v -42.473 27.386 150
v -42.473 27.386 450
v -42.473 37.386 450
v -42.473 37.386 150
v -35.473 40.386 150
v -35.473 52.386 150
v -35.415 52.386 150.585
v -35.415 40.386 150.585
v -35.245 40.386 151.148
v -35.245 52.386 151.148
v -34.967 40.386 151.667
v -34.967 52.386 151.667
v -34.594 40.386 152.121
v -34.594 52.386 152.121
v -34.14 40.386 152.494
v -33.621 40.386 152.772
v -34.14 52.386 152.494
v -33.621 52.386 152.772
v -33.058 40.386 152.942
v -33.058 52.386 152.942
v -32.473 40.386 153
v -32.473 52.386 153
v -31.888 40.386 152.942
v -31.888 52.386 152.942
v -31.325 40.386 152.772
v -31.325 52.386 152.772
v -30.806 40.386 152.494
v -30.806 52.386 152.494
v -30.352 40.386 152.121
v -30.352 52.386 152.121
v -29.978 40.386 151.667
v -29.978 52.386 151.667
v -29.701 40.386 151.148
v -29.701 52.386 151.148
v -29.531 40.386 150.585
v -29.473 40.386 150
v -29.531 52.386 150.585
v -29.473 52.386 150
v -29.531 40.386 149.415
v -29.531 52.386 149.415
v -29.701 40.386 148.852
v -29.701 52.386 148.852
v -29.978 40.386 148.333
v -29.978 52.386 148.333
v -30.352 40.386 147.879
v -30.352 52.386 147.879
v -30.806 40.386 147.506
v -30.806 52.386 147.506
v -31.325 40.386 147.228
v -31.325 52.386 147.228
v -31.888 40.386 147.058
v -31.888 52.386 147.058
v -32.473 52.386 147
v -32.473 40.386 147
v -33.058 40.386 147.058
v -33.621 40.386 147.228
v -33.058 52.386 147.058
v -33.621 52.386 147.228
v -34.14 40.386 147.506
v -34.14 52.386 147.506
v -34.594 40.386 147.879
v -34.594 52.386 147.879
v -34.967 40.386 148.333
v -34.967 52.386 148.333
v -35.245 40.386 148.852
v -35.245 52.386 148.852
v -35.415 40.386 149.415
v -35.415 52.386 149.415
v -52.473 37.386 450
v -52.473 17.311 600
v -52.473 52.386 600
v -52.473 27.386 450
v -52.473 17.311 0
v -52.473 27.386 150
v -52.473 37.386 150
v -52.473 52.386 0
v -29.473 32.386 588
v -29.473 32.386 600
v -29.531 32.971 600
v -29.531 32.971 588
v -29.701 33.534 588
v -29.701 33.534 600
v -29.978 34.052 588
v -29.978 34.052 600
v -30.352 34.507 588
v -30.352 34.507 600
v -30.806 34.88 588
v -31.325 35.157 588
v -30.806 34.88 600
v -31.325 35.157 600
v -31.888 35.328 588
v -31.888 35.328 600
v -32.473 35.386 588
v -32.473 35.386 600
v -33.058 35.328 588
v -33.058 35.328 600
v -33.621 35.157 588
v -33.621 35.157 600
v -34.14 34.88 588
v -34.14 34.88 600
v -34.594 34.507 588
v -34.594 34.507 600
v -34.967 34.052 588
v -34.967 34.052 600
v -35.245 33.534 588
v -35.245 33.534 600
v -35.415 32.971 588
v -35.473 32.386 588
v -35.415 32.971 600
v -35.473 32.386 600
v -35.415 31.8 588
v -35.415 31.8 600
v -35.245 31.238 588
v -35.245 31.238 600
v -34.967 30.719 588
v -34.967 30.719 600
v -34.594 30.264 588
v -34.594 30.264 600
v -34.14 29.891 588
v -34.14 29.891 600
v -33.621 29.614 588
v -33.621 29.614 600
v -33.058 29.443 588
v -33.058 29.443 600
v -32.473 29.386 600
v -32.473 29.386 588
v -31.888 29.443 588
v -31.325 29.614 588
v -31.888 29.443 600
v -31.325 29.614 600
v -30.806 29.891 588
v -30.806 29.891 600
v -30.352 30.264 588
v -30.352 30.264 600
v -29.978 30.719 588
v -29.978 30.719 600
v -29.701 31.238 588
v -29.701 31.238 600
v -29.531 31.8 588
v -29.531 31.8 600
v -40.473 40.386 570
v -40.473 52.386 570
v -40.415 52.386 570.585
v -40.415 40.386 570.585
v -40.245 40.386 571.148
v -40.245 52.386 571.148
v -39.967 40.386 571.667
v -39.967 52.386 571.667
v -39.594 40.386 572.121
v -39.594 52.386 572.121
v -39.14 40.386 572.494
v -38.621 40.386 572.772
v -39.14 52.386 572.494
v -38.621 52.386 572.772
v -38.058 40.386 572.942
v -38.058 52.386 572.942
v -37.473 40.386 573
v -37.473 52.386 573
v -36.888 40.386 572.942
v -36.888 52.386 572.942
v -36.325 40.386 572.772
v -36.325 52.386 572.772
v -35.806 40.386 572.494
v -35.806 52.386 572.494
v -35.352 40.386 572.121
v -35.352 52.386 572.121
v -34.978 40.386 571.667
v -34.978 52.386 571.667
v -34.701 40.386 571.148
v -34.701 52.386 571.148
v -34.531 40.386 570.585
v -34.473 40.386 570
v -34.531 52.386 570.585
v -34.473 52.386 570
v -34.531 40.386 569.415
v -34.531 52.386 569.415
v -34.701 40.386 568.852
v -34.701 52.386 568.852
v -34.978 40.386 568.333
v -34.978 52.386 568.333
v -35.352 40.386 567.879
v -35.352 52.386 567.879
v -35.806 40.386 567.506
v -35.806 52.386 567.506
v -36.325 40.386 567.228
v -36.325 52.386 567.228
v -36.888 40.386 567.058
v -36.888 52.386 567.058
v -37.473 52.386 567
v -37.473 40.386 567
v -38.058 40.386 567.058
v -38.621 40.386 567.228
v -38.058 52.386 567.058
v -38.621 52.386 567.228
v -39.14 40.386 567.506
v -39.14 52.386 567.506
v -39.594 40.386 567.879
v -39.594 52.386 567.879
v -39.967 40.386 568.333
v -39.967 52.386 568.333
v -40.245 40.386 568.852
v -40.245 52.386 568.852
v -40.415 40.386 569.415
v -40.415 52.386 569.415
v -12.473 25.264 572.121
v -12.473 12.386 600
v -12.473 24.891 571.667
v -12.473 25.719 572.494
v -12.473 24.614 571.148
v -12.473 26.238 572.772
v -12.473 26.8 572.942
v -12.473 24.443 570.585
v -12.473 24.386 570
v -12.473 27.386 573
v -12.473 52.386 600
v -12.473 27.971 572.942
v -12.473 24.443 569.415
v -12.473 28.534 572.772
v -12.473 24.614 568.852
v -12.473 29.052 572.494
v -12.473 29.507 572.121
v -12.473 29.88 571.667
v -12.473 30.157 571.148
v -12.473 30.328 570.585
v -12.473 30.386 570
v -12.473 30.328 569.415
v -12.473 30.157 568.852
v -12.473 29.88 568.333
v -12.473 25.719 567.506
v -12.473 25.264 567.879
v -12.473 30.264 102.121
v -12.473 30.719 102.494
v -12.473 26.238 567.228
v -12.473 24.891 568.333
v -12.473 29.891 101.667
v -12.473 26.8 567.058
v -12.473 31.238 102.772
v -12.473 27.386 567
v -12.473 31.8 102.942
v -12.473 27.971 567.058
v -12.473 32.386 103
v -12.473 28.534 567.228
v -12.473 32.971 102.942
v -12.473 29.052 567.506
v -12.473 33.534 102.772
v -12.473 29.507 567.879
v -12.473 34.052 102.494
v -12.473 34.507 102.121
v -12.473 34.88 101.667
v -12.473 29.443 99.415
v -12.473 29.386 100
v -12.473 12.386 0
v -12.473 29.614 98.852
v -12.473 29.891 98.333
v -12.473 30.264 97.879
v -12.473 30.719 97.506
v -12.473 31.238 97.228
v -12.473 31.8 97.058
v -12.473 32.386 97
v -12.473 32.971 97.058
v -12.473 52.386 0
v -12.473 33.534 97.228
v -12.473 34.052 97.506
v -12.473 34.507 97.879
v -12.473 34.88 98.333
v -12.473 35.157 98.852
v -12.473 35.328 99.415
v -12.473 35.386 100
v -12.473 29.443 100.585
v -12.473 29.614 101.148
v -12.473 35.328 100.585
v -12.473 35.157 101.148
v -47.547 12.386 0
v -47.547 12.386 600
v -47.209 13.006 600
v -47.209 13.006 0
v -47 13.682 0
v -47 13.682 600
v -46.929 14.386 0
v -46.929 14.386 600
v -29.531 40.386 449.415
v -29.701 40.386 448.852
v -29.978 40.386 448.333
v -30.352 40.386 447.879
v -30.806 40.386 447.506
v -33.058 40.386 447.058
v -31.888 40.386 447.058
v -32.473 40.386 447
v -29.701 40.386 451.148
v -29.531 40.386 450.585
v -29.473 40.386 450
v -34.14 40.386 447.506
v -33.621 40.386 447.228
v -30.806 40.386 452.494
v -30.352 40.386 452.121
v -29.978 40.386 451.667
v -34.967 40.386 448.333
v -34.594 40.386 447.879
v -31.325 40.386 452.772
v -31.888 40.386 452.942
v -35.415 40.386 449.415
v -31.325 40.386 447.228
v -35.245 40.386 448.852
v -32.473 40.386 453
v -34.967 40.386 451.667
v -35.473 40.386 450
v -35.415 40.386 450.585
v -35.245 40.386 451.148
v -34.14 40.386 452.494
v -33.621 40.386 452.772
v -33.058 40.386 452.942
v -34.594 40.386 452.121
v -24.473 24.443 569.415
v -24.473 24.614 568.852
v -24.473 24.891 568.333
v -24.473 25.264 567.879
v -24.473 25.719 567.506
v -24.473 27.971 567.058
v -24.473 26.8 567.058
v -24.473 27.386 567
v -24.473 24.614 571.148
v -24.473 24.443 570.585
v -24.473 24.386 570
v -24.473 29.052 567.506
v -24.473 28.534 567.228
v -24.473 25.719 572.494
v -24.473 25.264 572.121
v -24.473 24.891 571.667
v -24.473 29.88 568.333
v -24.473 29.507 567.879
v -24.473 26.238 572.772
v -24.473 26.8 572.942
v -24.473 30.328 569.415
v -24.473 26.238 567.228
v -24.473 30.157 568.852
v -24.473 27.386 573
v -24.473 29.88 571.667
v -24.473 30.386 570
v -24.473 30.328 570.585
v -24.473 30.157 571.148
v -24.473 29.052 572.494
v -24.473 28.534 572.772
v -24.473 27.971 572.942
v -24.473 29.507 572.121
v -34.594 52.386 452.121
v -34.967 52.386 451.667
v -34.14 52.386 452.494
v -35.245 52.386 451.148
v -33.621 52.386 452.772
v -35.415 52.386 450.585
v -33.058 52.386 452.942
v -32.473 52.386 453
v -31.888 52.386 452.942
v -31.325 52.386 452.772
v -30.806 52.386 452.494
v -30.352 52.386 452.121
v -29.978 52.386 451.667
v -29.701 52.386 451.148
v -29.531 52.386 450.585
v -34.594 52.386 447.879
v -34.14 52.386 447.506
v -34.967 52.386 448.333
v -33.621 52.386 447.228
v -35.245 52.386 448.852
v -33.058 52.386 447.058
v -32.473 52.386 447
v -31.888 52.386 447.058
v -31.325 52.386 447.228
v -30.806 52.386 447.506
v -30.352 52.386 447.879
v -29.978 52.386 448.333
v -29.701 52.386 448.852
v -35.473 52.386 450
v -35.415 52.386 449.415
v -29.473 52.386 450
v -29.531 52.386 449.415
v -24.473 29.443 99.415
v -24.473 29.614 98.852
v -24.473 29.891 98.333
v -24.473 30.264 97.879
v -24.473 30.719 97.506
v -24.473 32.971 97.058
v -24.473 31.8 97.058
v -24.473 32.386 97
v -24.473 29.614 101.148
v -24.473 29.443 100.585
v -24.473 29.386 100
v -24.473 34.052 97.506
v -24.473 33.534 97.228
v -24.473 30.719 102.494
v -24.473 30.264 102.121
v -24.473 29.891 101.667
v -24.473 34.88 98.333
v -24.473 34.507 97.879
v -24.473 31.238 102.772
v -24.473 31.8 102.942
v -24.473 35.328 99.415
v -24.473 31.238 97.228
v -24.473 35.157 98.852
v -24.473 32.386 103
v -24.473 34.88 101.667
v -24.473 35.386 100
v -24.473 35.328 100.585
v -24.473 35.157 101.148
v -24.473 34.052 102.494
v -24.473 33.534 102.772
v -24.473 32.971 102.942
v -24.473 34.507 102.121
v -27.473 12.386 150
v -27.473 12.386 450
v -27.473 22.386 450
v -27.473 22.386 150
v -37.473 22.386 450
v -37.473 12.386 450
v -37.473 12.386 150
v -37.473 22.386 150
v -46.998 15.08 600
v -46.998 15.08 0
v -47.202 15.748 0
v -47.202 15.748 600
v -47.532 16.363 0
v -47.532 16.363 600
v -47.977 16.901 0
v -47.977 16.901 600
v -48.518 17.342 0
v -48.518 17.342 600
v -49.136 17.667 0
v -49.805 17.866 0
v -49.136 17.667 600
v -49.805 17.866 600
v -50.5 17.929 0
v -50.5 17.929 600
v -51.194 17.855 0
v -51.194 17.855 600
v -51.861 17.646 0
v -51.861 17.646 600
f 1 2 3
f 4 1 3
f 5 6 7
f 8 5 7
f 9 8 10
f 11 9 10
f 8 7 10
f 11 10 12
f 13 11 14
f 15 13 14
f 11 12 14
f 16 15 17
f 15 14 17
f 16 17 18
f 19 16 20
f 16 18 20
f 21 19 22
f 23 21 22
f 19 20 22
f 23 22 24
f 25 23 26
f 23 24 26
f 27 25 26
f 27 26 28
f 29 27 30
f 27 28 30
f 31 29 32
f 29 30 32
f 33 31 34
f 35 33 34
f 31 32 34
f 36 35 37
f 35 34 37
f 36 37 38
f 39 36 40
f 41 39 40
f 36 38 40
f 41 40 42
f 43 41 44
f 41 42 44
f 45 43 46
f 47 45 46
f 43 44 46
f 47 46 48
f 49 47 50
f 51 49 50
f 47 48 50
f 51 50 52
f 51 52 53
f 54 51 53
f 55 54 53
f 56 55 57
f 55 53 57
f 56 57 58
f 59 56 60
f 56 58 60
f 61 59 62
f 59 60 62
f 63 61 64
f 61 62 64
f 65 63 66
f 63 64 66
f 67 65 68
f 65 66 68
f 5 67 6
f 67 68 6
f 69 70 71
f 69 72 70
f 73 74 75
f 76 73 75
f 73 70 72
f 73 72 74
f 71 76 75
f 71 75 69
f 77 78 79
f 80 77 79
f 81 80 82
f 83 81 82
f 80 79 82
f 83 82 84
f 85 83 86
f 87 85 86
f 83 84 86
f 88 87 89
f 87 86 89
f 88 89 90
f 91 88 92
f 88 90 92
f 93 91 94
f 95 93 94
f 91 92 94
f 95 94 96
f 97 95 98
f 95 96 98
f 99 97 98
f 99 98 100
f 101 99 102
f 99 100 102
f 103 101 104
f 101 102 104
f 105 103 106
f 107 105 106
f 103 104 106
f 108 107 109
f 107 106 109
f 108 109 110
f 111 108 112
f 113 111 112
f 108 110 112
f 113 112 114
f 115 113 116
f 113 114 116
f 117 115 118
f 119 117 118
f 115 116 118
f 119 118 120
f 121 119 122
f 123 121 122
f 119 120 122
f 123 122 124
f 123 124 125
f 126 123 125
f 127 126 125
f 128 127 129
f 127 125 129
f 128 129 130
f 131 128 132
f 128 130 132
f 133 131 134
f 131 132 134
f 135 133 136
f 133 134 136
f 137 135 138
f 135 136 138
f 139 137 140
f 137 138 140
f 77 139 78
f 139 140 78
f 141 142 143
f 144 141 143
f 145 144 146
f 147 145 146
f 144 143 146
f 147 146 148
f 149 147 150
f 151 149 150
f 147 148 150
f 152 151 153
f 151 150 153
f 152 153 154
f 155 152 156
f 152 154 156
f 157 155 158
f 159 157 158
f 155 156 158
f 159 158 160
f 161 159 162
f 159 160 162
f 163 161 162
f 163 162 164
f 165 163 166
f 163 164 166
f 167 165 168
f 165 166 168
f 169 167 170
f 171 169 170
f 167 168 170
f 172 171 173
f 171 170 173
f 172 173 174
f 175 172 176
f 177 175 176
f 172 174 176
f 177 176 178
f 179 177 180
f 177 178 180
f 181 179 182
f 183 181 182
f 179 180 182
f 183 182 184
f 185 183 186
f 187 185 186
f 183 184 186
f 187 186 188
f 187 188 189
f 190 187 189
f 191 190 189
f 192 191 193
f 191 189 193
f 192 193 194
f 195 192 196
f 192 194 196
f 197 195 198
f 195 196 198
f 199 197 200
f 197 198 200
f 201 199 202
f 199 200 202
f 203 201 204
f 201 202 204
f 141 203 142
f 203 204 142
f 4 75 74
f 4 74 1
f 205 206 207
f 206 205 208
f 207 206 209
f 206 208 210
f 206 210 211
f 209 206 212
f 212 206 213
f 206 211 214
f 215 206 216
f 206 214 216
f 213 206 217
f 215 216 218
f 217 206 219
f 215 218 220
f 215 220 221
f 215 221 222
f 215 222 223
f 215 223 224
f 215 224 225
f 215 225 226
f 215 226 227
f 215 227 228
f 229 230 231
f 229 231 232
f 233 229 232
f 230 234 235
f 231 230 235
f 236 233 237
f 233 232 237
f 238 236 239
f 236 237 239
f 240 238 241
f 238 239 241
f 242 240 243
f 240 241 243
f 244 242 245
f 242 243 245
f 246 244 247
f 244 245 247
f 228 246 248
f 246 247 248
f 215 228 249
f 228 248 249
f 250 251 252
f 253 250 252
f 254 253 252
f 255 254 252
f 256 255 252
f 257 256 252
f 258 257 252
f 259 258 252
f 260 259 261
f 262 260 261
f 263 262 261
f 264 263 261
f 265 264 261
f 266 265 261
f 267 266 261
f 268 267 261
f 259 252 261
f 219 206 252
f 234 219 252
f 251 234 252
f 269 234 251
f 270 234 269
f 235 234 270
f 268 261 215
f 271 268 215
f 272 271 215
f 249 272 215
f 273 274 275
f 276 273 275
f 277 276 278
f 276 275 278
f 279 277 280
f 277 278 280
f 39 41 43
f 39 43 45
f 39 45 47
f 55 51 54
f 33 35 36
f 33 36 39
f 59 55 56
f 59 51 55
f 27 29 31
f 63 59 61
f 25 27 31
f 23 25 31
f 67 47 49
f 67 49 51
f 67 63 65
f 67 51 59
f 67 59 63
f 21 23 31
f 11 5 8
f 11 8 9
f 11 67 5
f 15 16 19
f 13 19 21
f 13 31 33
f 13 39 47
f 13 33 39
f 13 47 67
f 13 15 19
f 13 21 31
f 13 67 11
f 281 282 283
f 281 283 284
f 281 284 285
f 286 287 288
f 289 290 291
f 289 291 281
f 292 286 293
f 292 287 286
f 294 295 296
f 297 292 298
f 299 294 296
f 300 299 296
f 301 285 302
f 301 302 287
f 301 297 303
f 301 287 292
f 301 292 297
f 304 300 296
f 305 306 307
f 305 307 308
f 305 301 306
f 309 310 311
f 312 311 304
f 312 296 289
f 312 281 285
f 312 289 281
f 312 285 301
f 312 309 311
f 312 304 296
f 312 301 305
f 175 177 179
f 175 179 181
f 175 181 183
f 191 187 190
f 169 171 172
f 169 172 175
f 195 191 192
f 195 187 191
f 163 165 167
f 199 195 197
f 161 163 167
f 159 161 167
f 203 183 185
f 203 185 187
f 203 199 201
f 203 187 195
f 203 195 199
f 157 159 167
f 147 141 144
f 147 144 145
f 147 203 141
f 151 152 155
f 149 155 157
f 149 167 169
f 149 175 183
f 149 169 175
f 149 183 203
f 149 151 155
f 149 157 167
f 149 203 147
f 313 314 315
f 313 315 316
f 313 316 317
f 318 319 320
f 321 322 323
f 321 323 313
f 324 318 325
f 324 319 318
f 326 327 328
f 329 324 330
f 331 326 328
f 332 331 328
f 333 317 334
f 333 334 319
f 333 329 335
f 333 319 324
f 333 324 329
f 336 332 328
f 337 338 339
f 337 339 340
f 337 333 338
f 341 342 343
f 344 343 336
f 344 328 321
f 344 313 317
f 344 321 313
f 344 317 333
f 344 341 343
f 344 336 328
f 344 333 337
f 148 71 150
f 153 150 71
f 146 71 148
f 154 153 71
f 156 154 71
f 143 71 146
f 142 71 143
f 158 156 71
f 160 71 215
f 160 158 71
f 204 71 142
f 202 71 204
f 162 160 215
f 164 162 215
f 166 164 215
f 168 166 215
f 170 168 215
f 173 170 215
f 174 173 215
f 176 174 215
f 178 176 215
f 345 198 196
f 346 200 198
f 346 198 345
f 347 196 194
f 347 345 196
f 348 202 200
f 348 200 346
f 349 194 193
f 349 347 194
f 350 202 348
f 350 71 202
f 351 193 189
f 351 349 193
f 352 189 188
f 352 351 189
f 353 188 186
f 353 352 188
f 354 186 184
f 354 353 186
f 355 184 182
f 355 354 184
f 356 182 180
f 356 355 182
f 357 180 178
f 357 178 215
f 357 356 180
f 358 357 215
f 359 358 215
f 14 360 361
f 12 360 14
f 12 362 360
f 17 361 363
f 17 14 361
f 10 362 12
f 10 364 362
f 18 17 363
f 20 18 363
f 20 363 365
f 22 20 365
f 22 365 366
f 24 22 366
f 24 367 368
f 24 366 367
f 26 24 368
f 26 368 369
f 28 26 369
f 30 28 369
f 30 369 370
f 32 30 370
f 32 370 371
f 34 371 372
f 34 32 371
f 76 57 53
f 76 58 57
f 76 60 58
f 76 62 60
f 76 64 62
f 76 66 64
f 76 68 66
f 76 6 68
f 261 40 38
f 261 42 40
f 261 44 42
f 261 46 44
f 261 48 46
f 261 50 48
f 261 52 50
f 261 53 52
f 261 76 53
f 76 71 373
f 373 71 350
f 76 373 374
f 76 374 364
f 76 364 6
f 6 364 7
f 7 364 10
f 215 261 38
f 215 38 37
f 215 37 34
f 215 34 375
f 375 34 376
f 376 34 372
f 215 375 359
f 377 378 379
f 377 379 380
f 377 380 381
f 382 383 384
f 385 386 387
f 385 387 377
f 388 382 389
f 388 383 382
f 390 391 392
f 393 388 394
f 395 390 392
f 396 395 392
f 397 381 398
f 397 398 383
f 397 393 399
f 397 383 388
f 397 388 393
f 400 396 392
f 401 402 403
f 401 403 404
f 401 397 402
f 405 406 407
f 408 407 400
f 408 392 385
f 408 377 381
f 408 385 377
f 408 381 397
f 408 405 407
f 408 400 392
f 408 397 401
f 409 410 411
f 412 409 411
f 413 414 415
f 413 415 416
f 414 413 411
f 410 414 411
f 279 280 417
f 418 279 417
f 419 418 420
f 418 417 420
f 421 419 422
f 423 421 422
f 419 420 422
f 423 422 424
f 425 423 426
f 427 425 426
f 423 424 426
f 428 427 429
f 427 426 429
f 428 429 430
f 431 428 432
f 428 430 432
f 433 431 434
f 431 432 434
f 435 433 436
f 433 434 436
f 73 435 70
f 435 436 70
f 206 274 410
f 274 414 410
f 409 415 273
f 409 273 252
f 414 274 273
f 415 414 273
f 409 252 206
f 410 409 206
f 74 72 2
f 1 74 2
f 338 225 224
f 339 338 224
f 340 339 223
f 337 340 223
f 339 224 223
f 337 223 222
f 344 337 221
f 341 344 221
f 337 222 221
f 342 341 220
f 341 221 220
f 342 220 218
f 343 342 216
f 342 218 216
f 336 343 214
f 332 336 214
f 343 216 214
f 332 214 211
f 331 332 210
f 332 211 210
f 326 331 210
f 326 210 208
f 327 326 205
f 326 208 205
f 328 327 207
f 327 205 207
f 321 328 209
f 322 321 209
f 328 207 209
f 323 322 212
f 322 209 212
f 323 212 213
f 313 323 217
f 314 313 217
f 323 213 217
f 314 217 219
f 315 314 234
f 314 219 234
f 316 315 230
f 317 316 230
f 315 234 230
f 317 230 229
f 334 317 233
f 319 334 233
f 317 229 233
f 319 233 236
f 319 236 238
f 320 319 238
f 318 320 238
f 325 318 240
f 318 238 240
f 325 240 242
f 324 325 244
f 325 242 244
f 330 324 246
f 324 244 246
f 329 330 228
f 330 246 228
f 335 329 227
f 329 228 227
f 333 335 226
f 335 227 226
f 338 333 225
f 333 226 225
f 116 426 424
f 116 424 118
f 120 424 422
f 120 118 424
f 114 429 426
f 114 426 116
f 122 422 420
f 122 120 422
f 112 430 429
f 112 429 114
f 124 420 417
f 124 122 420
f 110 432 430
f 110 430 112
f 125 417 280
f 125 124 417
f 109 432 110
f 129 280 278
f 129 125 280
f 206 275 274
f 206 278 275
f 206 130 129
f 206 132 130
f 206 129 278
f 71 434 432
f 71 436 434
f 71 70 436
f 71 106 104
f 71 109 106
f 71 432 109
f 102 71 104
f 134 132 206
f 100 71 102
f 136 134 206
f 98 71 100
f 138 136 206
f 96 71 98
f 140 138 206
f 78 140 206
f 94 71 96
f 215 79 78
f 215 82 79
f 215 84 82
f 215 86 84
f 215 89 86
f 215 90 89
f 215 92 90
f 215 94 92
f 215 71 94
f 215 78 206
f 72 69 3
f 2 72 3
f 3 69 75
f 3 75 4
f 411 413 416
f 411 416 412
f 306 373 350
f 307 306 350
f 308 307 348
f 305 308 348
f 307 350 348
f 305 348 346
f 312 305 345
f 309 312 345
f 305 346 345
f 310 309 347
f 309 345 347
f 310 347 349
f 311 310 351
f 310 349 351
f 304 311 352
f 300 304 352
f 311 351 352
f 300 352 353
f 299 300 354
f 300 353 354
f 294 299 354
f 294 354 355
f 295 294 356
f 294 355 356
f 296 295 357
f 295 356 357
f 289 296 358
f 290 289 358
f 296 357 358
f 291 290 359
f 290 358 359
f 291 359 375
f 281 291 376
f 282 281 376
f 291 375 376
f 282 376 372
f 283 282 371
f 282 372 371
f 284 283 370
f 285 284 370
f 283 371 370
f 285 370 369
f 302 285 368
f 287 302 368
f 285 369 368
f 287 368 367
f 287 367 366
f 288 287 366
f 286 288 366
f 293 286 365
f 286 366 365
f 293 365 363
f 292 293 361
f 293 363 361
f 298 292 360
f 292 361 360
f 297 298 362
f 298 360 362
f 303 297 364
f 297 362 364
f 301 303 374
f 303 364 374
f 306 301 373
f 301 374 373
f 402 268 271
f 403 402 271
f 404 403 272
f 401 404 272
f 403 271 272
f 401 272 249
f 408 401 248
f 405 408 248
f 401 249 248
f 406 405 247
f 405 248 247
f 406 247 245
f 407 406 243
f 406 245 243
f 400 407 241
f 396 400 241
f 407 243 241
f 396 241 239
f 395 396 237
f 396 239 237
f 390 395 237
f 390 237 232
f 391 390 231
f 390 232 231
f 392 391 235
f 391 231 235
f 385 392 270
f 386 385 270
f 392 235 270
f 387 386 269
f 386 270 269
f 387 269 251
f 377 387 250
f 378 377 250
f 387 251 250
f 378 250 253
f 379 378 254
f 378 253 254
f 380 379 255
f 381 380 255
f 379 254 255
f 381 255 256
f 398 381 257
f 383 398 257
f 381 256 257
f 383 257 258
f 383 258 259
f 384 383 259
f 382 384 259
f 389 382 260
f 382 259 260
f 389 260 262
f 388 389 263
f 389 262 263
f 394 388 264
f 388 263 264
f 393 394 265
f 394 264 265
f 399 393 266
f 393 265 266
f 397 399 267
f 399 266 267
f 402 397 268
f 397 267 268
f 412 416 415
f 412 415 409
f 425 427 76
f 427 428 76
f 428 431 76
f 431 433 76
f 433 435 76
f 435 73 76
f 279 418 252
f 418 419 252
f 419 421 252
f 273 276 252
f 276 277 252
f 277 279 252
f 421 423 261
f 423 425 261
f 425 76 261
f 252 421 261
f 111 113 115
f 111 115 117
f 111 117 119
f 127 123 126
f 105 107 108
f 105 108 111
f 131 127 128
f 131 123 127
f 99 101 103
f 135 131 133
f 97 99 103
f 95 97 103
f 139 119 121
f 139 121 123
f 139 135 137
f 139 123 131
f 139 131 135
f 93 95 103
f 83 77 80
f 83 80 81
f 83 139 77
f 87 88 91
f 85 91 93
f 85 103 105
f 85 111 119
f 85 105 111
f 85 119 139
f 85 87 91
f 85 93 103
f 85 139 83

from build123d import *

# Parameters (mm, degrees)
F0_W      = 40
F0_H      = 40
F1_DEPTH  = 600
F2_R      = 3
F3_DEPTH  = 12
F4_R      = 3
F5_DEPTH  = 12
F7_DEPTH  = 600
F8_R      = 3
F9_DEPTH  = 12
F10_DEPTH = 12
F11_R     = 3
F12_DEPTH = 12
F13_R     = 3
F14_DEPTH = 12
F16_W     = 10
F16_H     = 10
F17_DEPTH = 300
F18_DEPTH = 300


with BuildPart() as f1:
    # F0 (on Top) → F1 (new body)
    with BuildSketch(Plane.XY):
        with Locations((-32.4728810042, 32.3857110739)):
            Rectangle(F0_W, F0_H)
    extrude(amount=F1_DEPTH)

    # F2 (on face) → F3 (cut)
    with BuildSketch(Plane.YZ.offset(-12.4728810042)):
        with Locations((27.3857110739, 570)):
            Circle(F2_R)
    extrude(amount=-F3_DEPTH, mode=Mode.SUBTRACT)

    # F4 (on face) → F5 (cut)
    with BuildSketch(Plane(origin=(0, 52.3857110739, 0), x_dir=(-1, 0, 0), z_dir=(0, 1, 0))):
        with Locations((37.4728810042, 570)):
            Circle(F4_R)
    extrude(amount=-F5_DEPTH, mode=Mode.SUBTRACT)

    # F6 (on face) → F7 (cut)
    with BuildSketch(Plane.XY.offset(600)):
        with BuildLine():
            ThreePointArc((-47.5474812124, 12.3857110739), (-47.0872668168, 13.3390112528), (-46.9291592401, 14.3857110739))
            ThreePointArc((-46.9291592401, 14.3857110739), (-48.8190187951, 17.5198303656), (-52.4728810042, 17.3111108656))
            Line((-52.4728810042, 17.3111108656), (-52.4728810042, 12.3857110739))
            Line((-52.4728810042, 12.3857110739), (-47.5474812124, 12.3857110739))
        make_face()
    extrude(amount=-F7_DEPTH, mode=Mode.SUBTRACT)

    # F8 (on face) → F9 (cut)
    with BuildSketch(Plane.XY.offset(600)):
        with Locations((-32.4728810042, 32.3857110739)):
            Circle(F8_R)
    extrude(amount=-F9_DEPTH, mode=Mode.SUBTRACT)

    # F4 (on face) → F10 (cut)
    with BuildSketch(Plane(origin=(0, 52.3857110739, 0), x_dir=(-1, 0, 0), z_dir=(0, 1, 0))):
        with Locations((32.4728810042, 450)):
            Circle(F4_R)
    extrude(amount=-F10_DEPTH, mode=Mode.SUBTRACT)

    # F11 (on face) → F12 (cut)
    with BuildSketch(Plane(origin=(0, 52.3857110739, 0), x_dir=(-1, 0, 0), z_dir=(0, 1, 0))):
        with Locations((32.4728810042, 150)):
            Circle(F11_R)
    extrude(amount=-F12_DEPTH, mode=Mode.SUBTRACT)

    # F13 (on face) → F14 (cut)
    with BuildSketch(Plane.YZ.offset(-12.4728810042)):
        with Locations((32.3857110739, 100)):
            Circle(F13_R)
    extrude(amount=-F14_DEPTH, mode=Mode.SUBTRACT)

    # F16 (on offset) → F17 (cut)
    with BuildSketch(Plane.XY.offset(450)):
        with Locations((-47.4728810042, 32.3857110739)):
            Rectangle(F16_W, F16_H)
    extrude(amount=-F17_DEPTH, mode=Mode.SUBTRACT)

    # F16 (on offset) → F18 (cut)
    with BuildSketch(Plane.XY.offset(450)):
        with Locations((-32.4728810042, 17.3857110739)):
            Rectangle(F16_W, F16_H)
    extrude(amount=-F18_DEPTH, mode=Mode.SUBTRACT)


solid = f1.part
